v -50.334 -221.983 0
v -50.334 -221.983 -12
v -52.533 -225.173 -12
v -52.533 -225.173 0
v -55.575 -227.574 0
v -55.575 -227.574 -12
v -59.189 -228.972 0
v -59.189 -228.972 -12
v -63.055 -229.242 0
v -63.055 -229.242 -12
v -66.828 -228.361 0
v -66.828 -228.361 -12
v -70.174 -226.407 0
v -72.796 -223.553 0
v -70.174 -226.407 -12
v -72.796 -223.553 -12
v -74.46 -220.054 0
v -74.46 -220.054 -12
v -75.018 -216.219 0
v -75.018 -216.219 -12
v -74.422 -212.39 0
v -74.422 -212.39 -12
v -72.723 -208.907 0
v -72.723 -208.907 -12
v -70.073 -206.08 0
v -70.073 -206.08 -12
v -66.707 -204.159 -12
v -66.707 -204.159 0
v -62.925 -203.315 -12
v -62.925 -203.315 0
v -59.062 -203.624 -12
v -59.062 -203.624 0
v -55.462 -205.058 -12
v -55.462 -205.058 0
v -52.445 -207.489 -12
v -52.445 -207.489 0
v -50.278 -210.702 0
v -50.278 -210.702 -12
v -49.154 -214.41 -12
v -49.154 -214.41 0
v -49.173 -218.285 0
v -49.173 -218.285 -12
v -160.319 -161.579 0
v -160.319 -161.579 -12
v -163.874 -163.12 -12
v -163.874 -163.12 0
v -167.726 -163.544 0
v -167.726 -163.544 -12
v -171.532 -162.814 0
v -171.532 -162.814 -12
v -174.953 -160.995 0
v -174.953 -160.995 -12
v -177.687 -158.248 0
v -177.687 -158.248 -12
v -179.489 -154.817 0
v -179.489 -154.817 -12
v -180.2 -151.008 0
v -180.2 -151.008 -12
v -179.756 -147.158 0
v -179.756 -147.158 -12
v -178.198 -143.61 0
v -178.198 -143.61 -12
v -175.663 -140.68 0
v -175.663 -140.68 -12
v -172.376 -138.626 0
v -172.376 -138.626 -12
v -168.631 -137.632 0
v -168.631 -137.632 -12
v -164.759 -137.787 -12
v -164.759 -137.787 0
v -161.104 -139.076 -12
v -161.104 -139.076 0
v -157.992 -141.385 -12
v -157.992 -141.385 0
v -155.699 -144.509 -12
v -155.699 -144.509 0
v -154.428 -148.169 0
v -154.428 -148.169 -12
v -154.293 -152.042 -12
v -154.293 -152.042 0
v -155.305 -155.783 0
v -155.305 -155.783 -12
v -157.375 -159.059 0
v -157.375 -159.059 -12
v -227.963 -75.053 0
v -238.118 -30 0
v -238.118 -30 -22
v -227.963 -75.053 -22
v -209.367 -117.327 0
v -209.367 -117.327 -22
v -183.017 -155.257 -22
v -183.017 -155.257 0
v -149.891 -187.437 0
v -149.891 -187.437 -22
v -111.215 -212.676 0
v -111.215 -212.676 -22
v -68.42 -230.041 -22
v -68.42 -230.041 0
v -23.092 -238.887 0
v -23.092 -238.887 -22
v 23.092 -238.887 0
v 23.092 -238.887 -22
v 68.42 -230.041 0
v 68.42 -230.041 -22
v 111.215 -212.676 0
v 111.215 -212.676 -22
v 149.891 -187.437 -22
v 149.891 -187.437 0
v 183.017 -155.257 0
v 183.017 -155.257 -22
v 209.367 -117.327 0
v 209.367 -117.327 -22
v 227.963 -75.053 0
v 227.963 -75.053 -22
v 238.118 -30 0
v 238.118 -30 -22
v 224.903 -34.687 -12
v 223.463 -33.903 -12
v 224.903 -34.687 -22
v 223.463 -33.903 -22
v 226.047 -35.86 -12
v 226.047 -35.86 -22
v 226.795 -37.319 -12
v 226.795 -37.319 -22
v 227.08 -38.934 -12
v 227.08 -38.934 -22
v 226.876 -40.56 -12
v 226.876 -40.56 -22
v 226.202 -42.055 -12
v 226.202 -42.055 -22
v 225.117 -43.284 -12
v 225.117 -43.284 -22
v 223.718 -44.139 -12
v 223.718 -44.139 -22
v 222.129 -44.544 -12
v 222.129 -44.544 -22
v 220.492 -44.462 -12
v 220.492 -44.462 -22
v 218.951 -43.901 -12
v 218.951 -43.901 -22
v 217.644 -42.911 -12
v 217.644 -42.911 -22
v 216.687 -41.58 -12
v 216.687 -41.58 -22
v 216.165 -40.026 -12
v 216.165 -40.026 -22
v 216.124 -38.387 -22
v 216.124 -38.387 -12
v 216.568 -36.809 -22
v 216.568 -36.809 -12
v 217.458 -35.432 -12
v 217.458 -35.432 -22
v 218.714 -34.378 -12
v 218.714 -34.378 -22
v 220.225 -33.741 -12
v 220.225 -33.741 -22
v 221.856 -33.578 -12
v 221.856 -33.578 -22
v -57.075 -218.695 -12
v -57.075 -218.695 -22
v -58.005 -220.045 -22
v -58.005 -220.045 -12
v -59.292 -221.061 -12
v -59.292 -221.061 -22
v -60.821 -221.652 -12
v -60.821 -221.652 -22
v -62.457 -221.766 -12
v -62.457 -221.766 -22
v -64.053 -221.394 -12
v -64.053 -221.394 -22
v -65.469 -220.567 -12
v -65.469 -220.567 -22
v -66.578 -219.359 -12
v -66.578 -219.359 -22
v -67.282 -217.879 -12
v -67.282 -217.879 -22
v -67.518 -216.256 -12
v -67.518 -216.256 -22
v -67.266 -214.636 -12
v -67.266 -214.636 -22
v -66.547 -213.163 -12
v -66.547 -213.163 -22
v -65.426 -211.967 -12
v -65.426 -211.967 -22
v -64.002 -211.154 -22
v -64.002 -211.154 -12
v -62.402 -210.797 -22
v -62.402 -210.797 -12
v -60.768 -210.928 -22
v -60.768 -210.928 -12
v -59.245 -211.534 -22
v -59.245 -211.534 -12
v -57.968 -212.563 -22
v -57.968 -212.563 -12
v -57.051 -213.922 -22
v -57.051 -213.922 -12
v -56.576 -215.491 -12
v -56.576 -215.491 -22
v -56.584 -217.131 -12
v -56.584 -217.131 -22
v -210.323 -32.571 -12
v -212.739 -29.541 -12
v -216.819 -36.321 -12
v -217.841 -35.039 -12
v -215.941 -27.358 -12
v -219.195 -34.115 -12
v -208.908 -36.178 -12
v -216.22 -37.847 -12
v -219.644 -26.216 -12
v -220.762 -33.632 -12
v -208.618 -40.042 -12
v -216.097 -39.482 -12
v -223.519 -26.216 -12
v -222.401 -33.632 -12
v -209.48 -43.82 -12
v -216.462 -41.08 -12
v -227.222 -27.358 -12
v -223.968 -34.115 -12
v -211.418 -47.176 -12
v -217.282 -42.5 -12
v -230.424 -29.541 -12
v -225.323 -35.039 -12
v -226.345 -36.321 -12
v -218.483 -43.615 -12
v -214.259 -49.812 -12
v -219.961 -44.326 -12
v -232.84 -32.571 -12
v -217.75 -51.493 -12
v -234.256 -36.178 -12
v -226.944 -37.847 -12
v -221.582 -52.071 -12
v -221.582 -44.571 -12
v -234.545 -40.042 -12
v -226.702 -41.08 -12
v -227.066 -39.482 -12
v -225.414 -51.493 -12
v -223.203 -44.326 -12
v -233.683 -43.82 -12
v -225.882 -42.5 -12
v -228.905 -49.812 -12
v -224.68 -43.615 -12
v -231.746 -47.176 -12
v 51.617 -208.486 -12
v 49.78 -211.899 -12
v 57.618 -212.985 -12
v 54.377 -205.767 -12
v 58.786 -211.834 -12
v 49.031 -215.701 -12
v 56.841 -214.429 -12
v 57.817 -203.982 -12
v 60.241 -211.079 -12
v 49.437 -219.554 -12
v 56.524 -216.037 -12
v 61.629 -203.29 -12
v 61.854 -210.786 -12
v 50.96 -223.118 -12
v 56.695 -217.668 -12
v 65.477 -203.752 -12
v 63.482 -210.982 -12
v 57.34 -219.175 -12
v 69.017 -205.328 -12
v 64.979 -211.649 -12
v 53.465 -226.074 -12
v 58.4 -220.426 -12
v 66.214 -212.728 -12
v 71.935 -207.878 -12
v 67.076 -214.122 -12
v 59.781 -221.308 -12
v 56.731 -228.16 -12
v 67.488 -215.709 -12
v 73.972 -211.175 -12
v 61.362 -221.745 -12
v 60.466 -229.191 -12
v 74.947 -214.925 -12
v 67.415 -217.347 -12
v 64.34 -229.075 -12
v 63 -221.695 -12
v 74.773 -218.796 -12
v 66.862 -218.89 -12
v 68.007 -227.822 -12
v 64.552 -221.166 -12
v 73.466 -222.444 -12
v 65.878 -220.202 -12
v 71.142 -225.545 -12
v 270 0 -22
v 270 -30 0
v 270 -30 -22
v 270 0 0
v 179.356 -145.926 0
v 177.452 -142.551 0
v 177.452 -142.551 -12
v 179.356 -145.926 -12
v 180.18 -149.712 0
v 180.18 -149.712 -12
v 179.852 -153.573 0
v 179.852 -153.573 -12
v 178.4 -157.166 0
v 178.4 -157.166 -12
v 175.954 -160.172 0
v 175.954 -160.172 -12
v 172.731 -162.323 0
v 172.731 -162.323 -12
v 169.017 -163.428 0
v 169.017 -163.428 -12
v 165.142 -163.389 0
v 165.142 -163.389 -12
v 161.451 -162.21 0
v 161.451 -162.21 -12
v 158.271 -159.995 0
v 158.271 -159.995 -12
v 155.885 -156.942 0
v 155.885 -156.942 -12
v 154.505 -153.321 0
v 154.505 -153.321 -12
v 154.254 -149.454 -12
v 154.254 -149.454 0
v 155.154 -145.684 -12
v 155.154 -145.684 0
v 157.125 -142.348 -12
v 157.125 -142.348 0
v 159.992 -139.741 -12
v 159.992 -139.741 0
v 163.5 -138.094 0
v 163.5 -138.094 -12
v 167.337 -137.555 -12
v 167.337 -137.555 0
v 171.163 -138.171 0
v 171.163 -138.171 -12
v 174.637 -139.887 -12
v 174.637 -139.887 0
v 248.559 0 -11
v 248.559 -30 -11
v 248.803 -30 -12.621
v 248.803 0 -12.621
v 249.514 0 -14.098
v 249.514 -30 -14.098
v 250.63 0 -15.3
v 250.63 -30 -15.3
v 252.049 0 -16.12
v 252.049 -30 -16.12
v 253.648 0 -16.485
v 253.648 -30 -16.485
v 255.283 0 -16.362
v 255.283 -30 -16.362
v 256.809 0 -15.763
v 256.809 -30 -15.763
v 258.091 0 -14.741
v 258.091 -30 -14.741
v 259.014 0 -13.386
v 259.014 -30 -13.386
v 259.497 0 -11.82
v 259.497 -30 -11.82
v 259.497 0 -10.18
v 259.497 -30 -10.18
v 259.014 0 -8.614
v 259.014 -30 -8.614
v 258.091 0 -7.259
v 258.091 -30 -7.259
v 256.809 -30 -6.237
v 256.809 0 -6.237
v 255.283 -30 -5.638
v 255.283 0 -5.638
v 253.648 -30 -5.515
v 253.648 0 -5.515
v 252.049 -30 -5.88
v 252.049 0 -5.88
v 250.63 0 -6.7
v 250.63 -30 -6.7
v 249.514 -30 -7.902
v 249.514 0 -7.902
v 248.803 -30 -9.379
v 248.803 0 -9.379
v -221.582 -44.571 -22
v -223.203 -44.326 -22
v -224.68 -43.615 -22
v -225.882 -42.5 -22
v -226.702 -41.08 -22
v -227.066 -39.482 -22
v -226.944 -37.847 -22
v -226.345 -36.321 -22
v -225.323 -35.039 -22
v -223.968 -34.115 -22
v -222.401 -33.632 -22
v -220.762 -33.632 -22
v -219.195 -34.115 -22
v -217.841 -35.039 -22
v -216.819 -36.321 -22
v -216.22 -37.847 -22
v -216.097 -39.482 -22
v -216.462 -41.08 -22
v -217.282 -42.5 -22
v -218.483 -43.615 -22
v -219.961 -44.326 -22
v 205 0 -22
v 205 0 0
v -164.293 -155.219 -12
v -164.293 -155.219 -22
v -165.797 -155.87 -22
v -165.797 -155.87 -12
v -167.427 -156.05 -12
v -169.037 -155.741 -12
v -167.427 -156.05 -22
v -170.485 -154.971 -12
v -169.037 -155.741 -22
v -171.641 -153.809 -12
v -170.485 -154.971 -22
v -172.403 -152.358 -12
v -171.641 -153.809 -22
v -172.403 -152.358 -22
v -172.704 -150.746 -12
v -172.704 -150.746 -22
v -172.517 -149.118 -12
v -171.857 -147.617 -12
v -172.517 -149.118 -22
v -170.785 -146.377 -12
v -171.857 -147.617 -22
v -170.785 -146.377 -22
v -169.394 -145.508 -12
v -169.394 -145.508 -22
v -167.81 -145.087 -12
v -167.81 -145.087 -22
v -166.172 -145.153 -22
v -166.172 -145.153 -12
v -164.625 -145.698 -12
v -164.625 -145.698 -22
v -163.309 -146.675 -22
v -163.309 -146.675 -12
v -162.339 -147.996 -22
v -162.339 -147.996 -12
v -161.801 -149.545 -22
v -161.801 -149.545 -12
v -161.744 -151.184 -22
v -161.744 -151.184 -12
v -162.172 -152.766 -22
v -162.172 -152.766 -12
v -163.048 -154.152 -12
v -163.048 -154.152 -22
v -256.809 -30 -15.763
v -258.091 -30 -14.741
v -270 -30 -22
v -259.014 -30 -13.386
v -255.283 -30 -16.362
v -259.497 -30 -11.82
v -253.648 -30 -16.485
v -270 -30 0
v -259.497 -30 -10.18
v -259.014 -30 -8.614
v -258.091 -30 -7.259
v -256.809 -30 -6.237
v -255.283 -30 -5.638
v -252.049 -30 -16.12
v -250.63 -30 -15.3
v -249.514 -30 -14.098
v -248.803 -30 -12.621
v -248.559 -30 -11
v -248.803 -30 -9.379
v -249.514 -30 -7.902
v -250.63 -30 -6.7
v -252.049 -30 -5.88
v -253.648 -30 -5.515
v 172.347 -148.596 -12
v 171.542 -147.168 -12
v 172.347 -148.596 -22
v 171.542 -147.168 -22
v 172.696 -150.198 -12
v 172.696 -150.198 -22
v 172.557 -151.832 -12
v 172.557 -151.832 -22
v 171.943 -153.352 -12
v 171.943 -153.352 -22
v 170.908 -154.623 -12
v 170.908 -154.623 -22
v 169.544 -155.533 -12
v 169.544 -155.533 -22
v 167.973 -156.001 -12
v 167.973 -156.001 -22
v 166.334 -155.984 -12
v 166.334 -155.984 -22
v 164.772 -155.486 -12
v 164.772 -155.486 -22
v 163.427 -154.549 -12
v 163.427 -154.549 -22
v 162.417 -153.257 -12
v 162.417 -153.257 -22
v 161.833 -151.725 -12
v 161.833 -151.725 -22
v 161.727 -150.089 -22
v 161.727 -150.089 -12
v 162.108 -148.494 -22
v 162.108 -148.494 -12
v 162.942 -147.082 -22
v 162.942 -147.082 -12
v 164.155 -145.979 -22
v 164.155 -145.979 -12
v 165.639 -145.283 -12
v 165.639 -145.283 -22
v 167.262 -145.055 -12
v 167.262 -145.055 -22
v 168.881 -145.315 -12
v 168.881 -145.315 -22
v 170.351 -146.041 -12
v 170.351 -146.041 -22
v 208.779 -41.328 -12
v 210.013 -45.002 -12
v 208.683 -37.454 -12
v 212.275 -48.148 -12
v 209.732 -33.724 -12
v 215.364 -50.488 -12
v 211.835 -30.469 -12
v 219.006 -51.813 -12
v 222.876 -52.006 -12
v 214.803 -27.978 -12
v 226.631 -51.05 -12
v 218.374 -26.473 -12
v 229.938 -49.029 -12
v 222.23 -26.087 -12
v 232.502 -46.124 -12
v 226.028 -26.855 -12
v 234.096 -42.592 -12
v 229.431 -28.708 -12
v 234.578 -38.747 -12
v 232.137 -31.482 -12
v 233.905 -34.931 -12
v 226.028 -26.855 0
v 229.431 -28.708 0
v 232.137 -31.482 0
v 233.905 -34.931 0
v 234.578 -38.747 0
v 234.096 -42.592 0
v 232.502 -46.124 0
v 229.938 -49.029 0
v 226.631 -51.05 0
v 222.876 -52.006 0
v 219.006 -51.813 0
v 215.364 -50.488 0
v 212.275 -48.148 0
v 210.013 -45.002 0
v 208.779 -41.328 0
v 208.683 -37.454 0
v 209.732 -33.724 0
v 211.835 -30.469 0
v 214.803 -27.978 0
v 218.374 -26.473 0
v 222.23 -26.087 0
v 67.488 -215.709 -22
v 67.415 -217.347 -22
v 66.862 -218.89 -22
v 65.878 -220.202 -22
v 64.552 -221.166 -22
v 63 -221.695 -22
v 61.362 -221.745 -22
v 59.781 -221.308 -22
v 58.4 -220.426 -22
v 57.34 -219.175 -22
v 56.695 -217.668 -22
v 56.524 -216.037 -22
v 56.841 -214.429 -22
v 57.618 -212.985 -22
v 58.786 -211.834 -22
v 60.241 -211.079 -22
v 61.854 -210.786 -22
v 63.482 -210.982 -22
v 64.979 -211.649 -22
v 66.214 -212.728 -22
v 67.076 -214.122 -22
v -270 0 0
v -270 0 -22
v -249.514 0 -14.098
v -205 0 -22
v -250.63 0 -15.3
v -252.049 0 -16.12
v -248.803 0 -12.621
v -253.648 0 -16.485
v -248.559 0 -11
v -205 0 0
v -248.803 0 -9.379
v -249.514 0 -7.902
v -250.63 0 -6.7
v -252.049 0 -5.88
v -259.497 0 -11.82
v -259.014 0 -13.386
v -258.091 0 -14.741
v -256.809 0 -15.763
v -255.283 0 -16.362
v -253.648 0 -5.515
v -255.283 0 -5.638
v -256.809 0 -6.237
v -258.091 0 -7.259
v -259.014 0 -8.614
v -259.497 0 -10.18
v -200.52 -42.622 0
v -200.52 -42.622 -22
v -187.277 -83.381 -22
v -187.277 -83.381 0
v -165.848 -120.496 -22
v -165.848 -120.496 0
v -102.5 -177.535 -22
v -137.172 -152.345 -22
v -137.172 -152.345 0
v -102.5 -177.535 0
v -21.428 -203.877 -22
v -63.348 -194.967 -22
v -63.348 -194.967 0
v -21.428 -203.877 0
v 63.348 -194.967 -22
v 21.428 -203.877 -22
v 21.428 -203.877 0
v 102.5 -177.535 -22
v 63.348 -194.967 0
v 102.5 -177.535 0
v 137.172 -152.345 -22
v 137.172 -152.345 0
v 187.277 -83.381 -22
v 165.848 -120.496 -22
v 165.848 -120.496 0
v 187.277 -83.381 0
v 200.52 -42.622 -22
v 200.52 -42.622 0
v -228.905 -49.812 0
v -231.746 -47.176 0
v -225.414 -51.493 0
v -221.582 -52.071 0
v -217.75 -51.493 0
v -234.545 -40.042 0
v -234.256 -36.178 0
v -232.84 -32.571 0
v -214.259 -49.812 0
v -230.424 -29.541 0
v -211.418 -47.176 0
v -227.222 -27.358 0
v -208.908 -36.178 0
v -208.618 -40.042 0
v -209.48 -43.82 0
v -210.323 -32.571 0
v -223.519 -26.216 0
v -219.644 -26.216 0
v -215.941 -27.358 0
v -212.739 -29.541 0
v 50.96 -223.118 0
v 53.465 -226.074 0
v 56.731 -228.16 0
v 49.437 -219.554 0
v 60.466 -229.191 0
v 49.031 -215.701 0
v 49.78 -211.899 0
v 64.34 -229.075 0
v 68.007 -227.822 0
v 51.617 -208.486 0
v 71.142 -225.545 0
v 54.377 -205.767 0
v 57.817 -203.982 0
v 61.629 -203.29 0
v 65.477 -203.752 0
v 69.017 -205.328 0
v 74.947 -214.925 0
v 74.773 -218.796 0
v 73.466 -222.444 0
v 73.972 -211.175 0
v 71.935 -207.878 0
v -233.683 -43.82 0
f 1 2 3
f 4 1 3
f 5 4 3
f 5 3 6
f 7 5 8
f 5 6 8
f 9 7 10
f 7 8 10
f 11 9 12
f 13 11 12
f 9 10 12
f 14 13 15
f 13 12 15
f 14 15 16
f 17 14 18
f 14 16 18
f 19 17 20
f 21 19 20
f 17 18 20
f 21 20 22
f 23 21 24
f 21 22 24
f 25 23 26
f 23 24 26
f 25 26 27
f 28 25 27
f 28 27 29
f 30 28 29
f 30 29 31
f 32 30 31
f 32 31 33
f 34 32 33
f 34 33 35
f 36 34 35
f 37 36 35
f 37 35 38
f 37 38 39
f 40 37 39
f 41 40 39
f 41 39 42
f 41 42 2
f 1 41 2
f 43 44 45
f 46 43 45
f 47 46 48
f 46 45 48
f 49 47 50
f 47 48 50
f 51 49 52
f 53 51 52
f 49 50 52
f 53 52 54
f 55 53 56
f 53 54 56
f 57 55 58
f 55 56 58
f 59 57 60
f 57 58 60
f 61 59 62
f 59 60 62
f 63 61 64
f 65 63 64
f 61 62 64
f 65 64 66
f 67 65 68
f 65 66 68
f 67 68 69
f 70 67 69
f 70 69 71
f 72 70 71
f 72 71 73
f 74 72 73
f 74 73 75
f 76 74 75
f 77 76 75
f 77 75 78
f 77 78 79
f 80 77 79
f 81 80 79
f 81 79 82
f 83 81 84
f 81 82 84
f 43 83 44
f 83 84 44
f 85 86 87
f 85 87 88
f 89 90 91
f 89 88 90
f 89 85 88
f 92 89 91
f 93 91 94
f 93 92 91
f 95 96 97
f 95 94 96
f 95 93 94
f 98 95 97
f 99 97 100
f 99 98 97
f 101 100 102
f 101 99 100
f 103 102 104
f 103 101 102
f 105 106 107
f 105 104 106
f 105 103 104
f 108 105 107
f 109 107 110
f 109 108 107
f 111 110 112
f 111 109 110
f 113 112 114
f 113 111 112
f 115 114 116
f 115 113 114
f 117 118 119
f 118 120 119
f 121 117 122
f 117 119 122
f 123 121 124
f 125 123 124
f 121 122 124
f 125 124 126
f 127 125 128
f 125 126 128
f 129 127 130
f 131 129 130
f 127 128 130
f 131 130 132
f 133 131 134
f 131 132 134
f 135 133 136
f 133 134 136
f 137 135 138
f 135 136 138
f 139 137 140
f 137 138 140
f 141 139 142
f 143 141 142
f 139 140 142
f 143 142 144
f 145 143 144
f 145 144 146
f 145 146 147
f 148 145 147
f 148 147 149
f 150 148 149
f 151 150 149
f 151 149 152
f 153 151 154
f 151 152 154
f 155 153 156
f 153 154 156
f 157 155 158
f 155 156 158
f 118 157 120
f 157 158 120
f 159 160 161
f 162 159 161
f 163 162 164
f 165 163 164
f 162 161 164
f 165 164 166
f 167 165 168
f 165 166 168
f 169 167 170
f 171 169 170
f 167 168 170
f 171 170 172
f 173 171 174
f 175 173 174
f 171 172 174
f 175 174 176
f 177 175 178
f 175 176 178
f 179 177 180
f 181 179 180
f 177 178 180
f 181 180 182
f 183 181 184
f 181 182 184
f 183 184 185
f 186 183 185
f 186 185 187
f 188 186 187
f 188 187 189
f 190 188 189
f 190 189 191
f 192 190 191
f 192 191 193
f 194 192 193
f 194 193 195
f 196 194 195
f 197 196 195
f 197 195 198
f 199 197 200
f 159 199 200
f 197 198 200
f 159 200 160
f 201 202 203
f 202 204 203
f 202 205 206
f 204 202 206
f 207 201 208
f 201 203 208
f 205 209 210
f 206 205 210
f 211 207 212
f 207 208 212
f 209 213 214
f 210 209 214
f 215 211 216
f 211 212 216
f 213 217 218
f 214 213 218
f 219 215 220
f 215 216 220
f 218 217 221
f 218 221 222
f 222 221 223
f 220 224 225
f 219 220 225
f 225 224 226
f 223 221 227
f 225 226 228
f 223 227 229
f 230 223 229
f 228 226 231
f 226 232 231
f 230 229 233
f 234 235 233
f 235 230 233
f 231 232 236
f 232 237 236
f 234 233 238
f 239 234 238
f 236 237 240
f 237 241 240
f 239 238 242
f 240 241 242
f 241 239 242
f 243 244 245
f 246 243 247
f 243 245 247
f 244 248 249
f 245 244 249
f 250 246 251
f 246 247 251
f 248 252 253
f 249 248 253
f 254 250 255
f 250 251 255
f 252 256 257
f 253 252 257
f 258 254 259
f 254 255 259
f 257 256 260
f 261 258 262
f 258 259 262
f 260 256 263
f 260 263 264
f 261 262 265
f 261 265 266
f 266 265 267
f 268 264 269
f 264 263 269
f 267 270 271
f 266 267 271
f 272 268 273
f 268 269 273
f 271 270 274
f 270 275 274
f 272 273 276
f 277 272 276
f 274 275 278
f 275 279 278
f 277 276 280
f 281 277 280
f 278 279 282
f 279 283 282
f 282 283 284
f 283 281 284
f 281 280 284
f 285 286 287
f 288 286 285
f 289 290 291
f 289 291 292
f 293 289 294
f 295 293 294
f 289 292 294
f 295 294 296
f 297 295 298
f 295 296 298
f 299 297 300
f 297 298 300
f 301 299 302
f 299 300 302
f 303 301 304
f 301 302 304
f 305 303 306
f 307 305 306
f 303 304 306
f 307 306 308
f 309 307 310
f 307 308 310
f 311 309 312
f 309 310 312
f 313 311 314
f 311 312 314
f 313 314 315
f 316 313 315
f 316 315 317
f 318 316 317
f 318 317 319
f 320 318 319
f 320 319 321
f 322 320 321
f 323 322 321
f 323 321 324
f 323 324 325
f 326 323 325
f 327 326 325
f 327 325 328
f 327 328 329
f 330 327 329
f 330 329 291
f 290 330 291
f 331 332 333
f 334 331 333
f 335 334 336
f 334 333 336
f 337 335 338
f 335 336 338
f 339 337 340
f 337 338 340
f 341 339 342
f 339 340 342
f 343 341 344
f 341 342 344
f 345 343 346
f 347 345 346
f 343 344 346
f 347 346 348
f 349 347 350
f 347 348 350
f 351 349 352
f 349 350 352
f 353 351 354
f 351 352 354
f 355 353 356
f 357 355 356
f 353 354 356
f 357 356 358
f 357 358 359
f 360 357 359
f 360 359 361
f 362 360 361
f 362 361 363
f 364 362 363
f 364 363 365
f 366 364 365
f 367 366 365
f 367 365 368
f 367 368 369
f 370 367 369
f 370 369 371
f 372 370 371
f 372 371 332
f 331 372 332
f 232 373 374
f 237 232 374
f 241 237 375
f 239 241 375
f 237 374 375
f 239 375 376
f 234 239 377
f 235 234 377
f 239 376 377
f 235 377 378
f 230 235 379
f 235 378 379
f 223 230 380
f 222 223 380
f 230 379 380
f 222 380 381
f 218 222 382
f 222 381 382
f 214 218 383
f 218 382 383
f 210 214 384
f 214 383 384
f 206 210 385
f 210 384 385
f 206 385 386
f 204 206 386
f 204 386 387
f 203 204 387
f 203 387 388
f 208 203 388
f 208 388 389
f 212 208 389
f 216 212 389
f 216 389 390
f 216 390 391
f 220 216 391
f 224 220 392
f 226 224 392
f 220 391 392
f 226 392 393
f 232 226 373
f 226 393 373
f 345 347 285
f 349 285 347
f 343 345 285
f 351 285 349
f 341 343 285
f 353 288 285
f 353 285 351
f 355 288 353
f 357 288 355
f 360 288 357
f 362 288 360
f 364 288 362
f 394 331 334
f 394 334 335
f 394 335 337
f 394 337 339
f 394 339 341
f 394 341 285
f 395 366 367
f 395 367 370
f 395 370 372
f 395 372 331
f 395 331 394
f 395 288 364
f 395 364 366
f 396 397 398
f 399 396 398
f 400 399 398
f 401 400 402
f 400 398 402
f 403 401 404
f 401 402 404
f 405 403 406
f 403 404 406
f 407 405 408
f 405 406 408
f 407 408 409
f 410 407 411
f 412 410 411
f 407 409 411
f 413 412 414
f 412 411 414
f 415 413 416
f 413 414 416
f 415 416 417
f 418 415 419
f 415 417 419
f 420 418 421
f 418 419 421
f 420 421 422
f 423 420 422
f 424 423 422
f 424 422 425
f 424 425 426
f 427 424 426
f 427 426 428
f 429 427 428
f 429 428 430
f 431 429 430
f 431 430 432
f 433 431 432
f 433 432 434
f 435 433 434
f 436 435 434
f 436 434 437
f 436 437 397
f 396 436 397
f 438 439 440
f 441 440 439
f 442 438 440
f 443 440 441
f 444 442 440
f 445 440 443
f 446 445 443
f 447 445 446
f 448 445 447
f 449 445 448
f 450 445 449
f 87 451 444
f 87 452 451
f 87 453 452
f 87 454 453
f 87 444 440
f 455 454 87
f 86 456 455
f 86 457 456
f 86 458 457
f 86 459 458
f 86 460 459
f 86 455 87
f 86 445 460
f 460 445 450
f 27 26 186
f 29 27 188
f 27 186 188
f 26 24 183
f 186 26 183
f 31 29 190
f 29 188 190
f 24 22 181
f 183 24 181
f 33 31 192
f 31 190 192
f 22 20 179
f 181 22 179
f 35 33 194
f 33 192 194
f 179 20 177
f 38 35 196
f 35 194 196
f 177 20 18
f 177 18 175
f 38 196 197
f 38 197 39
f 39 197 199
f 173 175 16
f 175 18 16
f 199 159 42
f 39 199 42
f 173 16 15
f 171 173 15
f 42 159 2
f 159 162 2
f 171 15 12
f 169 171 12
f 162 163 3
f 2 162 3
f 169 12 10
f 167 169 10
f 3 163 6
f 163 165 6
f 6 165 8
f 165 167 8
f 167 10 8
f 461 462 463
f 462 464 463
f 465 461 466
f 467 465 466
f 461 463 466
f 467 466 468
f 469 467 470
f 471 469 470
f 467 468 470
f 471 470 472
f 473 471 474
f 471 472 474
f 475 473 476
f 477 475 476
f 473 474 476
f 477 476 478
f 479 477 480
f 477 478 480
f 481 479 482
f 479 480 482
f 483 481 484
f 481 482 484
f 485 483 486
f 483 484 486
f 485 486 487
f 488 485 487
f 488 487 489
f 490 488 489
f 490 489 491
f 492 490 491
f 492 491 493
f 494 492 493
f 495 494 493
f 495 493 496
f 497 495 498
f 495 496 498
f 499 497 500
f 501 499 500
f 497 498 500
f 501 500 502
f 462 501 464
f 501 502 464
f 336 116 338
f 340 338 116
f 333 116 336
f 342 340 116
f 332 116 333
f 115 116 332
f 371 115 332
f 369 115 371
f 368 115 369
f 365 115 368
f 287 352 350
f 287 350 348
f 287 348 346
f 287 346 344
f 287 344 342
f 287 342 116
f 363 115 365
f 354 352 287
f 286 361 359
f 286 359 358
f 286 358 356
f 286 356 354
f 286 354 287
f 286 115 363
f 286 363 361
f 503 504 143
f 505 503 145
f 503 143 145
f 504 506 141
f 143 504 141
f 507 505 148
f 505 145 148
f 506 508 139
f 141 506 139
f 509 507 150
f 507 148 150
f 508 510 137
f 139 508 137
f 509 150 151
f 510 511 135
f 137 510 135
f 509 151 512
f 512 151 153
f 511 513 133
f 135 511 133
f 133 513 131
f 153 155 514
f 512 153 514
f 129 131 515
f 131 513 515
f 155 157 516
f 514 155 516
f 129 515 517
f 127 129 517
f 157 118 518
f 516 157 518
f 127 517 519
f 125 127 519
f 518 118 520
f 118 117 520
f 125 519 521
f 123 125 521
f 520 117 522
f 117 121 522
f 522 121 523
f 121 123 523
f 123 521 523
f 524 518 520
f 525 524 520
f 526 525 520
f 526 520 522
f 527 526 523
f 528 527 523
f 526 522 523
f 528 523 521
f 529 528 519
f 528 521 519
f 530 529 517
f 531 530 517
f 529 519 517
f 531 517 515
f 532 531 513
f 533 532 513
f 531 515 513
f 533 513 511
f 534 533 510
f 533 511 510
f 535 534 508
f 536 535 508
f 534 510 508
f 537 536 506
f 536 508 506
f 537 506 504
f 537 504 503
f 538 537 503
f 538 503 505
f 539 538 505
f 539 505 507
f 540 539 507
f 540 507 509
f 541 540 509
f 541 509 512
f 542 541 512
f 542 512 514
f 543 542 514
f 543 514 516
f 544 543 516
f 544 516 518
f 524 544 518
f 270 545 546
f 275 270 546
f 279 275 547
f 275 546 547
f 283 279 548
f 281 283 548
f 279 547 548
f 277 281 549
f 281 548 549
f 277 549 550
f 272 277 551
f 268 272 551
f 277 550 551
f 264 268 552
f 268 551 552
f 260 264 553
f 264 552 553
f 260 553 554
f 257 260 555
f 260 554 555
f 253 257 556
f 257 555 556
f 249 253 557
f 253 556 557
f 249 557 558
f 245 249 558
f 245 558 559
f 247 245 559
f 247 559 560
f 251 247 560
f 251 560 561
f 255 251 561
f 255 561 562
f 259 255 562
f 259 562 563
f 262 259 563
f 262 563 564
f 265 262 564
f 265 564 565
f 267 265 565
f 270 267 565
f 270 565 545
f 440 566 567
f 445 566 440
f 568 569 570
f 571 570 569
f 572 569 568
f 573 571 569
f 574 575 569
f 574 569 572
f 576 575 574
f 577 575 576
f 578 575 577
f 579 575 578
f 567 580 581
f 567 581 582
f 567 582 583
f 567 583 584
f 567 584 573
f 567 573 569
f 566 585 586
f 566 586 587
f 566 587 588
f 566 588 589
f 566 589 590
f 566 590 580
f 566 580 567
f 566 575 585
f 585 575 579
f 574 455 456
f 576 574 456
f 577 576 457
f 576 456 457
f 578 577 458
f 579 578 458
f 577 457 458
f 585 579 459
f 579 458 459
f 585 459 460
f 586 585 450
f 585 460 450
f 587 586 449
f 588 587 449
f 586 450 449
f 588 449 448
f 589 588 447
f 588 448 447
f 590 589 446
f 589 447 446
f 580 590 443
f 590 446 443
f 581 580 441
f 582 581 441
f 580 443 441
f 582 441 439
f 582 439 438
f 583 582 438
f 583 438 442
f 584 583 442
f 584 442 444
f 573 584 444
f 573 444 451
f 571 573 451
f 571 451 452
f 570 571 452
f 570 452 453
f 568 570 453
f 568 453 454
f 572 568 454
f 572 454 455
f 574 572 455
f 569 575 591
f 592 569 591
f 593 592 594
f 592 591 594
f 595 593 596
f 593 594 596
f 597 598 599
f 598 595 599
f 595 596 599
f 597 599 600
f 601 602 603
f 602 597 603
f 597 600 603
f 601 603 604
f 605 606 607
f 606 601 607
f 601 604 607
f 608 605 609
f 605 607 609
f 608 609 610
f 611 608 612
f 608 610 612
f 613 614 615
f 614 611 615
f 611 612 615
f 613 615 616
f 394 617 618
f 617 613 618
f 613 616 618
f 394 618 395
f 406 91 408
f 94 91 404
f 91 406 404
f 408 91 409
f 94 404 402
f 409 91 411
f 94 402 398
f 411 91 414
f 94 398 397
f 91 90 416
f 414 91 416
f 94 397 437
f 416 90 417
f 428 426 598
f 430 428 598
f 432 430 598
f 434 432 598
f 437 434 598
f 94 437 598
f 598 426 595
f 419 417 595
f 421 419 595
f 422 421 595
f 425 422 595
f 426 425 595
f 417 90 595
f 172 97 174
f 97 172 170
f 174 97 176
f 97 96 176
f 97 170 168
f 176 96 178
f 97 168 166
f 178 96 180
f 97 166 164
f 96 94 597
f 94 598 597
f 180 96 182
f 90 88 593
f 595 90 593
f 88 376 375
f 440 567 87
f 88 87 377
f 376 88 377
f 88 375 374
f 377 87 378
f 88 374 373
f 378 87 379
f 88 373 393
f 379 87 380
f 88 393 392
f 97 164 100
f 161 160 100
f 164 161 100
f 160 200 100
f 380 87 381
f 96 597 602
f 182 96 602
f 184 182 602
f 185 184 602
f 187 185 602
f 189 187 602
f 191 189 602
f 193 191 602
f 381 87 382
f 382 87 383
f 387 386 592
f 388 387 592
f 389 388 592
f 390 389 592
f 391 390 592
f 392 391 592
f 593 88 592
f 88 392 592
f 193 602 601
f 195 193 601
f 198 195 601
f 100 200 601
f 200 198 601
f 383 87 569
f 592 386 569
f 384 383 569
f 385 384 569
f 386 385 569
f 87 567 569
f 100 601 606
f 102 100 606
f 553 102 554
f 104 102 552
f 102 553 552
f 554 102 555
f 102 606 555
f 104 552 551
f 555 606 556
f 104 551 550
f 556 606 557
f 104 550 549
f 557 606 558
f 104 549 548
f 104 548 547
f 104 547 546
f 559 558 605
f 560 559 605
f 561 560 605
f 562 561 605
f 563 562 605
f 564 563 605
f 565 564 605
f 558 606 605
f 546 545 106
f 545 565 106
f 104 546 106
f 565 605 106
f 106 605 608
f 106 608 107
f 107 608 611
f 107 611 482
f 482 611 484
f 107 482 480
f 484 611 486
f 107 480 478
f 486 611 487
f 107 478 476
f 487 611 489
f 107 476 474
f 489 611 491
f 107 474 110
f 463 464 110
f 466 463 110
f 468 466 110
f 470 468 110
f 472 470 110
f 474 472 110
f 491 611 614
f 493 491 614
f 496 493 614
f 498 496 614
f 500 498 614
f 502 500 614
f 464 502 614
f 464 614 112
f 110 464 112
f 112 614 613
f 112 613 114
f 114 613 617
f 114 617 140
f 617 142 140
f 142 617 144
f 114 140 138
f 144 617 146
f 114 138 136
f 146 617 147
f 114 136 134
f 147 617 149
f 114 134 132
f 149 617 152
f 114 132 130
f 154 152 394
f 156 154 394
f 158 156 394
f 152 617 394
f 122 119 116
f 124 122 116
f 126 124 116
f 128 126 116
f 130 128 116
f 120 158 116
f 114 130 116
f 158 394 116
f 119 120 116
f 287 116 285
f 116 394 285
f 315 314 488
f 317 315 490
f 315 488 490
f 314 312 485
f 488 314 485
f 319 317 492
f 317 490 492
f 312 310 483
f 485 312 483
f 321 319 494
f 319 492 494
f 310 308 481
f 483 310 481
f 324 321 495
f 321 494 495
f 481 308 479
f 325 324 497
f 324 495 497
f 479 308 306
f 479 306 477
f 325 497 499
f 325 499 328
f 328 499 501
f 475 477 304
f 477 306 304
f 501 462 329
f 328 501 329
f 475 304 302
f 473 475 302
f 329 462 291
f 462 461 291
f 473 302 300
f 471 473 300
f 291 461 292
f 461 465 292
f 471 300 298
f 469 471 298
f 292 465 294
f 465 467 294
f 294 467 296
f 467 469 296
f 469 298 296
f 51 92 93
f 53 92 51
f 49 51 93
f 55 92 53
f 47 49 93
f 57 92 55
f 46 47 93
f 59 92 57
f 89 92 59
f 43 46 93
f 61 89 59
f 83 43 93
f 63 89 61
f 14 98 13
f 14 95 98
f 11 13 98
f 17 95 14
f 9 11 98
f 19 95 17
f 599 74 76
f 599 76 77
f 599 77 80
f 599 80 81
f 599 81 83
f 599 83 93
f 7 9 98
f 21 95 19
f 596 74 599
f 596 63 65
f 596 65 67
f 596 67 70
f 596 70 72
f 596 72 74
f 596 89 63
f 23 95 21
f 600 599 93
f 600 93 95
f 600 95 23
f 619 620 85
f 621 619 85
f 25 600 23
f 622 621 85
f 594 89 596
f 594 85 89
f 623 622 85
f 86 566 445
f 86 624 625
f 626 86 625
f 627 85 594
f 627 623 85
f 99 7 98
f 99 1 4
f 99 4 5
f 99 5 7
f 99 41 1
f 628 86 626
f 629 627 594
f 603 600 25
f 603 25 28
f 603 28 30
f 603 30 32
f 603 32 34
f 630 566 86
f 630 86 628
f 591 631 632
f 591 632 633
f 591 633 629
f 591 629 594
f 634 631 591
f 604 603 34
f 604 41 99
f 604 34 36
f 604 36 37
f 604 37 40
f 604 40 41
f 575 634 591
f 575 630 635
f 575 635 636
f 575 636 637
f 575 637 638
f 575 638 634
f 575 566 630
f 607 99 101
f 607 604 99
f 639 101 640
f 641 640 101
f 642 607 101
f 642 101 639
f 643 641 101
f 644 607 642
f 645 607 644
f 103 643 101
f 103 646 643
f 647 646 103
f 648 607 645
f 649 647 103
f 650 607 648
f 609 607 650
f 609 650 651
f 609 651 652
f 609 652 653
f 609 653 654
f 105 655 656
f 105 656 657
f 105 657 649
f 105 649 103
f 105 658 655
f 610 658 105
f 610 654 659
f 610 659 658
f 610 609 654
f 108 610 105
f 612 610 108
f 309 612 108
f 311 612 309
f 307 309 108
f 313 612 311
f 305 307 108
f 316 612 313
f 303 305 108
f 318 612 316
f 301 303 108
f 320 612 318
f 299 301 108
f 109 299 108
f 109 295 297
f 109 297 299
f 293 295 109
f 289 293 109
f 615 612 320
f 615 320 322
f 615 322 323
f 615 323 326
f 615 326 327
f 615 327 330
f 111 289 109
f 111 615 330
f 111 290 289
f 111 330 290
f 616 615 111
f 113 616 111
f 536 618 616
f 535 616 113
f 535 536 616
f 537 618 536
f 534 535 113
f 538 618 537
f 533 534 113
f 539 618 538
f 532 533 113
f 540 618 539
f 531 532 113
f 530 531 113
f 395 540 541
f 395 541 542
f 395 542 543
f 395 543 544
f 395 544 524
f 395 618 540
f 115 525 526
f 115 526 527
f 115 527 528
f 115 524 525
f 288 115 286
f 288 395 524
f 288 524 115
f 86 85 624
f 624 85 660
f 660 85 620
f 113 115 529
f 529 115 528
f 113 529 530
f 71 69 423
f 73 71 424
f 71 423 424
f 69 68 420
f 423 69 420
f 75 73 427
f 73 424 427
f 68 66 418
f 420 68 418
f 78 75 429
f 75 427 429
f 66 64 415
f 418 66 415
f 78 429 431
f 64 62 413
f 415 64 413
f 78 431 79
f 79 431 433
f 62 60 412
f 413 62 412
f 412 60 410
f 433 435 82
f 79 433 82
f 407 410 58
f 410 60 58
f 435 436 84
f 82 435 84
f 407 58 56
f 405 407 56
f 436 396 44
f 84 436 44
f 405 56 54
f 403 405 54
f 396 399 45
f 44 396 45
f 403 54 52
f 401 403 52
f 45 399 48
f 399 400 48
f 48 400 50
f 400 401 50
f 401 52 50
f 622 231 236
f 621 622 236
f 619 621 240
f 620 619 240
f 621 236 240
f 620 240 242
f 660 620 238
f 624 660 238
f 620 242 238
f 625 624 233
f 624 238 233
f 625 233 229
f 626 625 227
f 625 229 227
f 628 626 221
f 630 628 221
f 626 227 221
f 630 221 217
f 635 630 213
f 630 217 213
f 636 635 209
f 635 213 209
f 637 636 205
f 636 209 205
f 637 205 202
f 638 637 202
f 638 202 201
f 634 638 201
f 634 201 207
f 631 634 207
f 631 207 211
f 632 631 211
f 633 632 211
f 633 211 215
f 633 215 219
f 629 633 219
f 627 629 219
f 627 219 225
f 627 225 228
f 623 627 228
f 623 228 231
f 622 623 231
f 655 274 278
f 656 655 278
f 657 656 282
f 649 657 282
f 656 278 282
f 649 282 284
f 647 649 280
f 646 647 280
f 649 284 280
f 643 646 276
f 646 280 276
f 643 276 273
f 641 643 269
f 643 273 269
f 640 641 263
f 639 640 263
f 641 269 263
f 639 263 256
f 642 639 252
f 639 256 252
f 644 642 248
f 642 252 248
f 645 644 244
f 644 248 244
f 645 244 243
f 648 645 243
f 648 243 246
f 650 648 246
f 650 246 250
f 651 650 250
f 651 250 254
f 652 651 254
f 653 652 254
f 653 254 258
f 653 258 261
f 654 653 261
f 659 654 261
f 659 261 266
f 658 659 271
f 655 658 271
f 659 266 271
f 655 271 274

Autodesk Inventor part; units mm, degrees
ref_plane "YZ Plane" through (0, 0, 0) normal (1, 0, 0) x (0, 1, 0)
ref_plane "XZ Plane" through (0, 0, 0) normal (0, 1, 0) x (-1, 0, 0)
ref_plane "XY Plane" through (0, 0, 0) normal (0, 0, 1) x (1, 0, 0)
sketch "Sketch1" plane through (0, 0, 0) normal (0, 0, 1) x (1, 0, 0)
  circle A0 centre (0, 0) radius 220 construction
  circle A1 centre (0, 0) radius 205
  circle A2 centre (0, 0) radius 240
  line L0 (-205, 0) -> (-205, 80) construction
  line L1 (-205, 80) -> (-240, 80) construction
  line L2 (-240, 80) -> (-240, 0) construction
  line L3 (-205, 0) -> (-240, 0)
  line L4 (-240, 0) -> (-270, 0)
  line L5 (-270, 0) -> (-270, -30)
  line L6 (-270, -30) -> (-238.1176, -30)
  line L7 (-1.5, -238) -> (1.5, -238)
  line L8 (1.5, -238) -> (1.5, -280)
  line L9 (1.5, -280) -> (-1.5, -280)
  line L10 (-1.5, -280) -> (-1.5, -238)
  line L11 (0, -238) -> (0, -205)
  line L12 (-1.5, -280) -> (-30, -280)
  line L13 (-30, -280) -> (-30, -238.1176)
  line L14 (0, -238) -> (0, -240)
  point P0 (0, -280)
  point P1 (-1.5, -239.9953)
  point P2 (1.5, -239.9953)
  dimension "d26" = 80
  dimension "d40" = 30
  dimension "d41" = 30
  dimension "d74" = 410
  dimension "d75" = 3
  dimension "d76" = 42
  dimension "d77" = 30
  dimension "d78" = 2
  dimension "d98" = 480
  dimension "d99" = 440
extrude "Extrusion1" add sketch "Sketch1" against normal blind 22 contours A1 L11 L7 L10 A2 L3 | A2 L6 L5 L4 | L14 A2 L10 L7
sketch "Sketch10" plane through (-270, -30, 0) normal (0, -1, 0) x (1, 0, 0)
  line L0 (0, 0) -> (31.8824, 0) projected
  line L1 (0, 0) -> (0, -22) projected
  line L2 (31.8824, -22) -> (0, -22) projected
  line L3 (31.8824, 0) -> (31.8824, -22) projected
  circle A0 centre (15.9412, -11) radius 5.5
  line L4 (0, 0) -> (0, -22) projected
  line L5 (0, 0) -> (31.8824, 0) projected
  point P0 (270, 0)
  point P1 (0, -11)
  point P2 (15.9412, 0)
  dimension "d79" = 11
extrude "Extrusion9" cut sketch "Sketch10" against normal through all contours A0
mirror "Mirror3" about plane through (0, 0, 0) normal (1, 0, 0) of "Extrusion1", "Extrusion9"
sketch "Sketch12" plane through (0, 0, 0) normal (0, 0, 1) x (1, 0, 0)
  line L0 (0, 0) -> (-225, 0) construction
  line L1 (0, 0) -> (-221.5817, -39.0708) construction
  circle A0 centre (0, 0) radius 225 construction
  dimension "d86" = 10
  dimension "d87" = 450
hole "Hole4" at (-221.5817, -39.0708, 0) direction (0, 0, -1) diameter 11 end through all counterbore diameter 26 counterbore depth 12
pattern_circular "Circular Pattern5" count 6 over 160 about axis through (0, 0, -10) along (0, 0, 1) of "Hole4"
equation "\"d41\" = d40"
equation "\"d77\" = d41"
equation "\"d93\" = Thickness"
equation "\"BendReliefDepth\" = 0.5 * Thickness"
equation "\"Thickness\" = 30"
properties part number "ДМФ 093 Постель КОРМА v2.0_CPY" material "Nylon 6"
